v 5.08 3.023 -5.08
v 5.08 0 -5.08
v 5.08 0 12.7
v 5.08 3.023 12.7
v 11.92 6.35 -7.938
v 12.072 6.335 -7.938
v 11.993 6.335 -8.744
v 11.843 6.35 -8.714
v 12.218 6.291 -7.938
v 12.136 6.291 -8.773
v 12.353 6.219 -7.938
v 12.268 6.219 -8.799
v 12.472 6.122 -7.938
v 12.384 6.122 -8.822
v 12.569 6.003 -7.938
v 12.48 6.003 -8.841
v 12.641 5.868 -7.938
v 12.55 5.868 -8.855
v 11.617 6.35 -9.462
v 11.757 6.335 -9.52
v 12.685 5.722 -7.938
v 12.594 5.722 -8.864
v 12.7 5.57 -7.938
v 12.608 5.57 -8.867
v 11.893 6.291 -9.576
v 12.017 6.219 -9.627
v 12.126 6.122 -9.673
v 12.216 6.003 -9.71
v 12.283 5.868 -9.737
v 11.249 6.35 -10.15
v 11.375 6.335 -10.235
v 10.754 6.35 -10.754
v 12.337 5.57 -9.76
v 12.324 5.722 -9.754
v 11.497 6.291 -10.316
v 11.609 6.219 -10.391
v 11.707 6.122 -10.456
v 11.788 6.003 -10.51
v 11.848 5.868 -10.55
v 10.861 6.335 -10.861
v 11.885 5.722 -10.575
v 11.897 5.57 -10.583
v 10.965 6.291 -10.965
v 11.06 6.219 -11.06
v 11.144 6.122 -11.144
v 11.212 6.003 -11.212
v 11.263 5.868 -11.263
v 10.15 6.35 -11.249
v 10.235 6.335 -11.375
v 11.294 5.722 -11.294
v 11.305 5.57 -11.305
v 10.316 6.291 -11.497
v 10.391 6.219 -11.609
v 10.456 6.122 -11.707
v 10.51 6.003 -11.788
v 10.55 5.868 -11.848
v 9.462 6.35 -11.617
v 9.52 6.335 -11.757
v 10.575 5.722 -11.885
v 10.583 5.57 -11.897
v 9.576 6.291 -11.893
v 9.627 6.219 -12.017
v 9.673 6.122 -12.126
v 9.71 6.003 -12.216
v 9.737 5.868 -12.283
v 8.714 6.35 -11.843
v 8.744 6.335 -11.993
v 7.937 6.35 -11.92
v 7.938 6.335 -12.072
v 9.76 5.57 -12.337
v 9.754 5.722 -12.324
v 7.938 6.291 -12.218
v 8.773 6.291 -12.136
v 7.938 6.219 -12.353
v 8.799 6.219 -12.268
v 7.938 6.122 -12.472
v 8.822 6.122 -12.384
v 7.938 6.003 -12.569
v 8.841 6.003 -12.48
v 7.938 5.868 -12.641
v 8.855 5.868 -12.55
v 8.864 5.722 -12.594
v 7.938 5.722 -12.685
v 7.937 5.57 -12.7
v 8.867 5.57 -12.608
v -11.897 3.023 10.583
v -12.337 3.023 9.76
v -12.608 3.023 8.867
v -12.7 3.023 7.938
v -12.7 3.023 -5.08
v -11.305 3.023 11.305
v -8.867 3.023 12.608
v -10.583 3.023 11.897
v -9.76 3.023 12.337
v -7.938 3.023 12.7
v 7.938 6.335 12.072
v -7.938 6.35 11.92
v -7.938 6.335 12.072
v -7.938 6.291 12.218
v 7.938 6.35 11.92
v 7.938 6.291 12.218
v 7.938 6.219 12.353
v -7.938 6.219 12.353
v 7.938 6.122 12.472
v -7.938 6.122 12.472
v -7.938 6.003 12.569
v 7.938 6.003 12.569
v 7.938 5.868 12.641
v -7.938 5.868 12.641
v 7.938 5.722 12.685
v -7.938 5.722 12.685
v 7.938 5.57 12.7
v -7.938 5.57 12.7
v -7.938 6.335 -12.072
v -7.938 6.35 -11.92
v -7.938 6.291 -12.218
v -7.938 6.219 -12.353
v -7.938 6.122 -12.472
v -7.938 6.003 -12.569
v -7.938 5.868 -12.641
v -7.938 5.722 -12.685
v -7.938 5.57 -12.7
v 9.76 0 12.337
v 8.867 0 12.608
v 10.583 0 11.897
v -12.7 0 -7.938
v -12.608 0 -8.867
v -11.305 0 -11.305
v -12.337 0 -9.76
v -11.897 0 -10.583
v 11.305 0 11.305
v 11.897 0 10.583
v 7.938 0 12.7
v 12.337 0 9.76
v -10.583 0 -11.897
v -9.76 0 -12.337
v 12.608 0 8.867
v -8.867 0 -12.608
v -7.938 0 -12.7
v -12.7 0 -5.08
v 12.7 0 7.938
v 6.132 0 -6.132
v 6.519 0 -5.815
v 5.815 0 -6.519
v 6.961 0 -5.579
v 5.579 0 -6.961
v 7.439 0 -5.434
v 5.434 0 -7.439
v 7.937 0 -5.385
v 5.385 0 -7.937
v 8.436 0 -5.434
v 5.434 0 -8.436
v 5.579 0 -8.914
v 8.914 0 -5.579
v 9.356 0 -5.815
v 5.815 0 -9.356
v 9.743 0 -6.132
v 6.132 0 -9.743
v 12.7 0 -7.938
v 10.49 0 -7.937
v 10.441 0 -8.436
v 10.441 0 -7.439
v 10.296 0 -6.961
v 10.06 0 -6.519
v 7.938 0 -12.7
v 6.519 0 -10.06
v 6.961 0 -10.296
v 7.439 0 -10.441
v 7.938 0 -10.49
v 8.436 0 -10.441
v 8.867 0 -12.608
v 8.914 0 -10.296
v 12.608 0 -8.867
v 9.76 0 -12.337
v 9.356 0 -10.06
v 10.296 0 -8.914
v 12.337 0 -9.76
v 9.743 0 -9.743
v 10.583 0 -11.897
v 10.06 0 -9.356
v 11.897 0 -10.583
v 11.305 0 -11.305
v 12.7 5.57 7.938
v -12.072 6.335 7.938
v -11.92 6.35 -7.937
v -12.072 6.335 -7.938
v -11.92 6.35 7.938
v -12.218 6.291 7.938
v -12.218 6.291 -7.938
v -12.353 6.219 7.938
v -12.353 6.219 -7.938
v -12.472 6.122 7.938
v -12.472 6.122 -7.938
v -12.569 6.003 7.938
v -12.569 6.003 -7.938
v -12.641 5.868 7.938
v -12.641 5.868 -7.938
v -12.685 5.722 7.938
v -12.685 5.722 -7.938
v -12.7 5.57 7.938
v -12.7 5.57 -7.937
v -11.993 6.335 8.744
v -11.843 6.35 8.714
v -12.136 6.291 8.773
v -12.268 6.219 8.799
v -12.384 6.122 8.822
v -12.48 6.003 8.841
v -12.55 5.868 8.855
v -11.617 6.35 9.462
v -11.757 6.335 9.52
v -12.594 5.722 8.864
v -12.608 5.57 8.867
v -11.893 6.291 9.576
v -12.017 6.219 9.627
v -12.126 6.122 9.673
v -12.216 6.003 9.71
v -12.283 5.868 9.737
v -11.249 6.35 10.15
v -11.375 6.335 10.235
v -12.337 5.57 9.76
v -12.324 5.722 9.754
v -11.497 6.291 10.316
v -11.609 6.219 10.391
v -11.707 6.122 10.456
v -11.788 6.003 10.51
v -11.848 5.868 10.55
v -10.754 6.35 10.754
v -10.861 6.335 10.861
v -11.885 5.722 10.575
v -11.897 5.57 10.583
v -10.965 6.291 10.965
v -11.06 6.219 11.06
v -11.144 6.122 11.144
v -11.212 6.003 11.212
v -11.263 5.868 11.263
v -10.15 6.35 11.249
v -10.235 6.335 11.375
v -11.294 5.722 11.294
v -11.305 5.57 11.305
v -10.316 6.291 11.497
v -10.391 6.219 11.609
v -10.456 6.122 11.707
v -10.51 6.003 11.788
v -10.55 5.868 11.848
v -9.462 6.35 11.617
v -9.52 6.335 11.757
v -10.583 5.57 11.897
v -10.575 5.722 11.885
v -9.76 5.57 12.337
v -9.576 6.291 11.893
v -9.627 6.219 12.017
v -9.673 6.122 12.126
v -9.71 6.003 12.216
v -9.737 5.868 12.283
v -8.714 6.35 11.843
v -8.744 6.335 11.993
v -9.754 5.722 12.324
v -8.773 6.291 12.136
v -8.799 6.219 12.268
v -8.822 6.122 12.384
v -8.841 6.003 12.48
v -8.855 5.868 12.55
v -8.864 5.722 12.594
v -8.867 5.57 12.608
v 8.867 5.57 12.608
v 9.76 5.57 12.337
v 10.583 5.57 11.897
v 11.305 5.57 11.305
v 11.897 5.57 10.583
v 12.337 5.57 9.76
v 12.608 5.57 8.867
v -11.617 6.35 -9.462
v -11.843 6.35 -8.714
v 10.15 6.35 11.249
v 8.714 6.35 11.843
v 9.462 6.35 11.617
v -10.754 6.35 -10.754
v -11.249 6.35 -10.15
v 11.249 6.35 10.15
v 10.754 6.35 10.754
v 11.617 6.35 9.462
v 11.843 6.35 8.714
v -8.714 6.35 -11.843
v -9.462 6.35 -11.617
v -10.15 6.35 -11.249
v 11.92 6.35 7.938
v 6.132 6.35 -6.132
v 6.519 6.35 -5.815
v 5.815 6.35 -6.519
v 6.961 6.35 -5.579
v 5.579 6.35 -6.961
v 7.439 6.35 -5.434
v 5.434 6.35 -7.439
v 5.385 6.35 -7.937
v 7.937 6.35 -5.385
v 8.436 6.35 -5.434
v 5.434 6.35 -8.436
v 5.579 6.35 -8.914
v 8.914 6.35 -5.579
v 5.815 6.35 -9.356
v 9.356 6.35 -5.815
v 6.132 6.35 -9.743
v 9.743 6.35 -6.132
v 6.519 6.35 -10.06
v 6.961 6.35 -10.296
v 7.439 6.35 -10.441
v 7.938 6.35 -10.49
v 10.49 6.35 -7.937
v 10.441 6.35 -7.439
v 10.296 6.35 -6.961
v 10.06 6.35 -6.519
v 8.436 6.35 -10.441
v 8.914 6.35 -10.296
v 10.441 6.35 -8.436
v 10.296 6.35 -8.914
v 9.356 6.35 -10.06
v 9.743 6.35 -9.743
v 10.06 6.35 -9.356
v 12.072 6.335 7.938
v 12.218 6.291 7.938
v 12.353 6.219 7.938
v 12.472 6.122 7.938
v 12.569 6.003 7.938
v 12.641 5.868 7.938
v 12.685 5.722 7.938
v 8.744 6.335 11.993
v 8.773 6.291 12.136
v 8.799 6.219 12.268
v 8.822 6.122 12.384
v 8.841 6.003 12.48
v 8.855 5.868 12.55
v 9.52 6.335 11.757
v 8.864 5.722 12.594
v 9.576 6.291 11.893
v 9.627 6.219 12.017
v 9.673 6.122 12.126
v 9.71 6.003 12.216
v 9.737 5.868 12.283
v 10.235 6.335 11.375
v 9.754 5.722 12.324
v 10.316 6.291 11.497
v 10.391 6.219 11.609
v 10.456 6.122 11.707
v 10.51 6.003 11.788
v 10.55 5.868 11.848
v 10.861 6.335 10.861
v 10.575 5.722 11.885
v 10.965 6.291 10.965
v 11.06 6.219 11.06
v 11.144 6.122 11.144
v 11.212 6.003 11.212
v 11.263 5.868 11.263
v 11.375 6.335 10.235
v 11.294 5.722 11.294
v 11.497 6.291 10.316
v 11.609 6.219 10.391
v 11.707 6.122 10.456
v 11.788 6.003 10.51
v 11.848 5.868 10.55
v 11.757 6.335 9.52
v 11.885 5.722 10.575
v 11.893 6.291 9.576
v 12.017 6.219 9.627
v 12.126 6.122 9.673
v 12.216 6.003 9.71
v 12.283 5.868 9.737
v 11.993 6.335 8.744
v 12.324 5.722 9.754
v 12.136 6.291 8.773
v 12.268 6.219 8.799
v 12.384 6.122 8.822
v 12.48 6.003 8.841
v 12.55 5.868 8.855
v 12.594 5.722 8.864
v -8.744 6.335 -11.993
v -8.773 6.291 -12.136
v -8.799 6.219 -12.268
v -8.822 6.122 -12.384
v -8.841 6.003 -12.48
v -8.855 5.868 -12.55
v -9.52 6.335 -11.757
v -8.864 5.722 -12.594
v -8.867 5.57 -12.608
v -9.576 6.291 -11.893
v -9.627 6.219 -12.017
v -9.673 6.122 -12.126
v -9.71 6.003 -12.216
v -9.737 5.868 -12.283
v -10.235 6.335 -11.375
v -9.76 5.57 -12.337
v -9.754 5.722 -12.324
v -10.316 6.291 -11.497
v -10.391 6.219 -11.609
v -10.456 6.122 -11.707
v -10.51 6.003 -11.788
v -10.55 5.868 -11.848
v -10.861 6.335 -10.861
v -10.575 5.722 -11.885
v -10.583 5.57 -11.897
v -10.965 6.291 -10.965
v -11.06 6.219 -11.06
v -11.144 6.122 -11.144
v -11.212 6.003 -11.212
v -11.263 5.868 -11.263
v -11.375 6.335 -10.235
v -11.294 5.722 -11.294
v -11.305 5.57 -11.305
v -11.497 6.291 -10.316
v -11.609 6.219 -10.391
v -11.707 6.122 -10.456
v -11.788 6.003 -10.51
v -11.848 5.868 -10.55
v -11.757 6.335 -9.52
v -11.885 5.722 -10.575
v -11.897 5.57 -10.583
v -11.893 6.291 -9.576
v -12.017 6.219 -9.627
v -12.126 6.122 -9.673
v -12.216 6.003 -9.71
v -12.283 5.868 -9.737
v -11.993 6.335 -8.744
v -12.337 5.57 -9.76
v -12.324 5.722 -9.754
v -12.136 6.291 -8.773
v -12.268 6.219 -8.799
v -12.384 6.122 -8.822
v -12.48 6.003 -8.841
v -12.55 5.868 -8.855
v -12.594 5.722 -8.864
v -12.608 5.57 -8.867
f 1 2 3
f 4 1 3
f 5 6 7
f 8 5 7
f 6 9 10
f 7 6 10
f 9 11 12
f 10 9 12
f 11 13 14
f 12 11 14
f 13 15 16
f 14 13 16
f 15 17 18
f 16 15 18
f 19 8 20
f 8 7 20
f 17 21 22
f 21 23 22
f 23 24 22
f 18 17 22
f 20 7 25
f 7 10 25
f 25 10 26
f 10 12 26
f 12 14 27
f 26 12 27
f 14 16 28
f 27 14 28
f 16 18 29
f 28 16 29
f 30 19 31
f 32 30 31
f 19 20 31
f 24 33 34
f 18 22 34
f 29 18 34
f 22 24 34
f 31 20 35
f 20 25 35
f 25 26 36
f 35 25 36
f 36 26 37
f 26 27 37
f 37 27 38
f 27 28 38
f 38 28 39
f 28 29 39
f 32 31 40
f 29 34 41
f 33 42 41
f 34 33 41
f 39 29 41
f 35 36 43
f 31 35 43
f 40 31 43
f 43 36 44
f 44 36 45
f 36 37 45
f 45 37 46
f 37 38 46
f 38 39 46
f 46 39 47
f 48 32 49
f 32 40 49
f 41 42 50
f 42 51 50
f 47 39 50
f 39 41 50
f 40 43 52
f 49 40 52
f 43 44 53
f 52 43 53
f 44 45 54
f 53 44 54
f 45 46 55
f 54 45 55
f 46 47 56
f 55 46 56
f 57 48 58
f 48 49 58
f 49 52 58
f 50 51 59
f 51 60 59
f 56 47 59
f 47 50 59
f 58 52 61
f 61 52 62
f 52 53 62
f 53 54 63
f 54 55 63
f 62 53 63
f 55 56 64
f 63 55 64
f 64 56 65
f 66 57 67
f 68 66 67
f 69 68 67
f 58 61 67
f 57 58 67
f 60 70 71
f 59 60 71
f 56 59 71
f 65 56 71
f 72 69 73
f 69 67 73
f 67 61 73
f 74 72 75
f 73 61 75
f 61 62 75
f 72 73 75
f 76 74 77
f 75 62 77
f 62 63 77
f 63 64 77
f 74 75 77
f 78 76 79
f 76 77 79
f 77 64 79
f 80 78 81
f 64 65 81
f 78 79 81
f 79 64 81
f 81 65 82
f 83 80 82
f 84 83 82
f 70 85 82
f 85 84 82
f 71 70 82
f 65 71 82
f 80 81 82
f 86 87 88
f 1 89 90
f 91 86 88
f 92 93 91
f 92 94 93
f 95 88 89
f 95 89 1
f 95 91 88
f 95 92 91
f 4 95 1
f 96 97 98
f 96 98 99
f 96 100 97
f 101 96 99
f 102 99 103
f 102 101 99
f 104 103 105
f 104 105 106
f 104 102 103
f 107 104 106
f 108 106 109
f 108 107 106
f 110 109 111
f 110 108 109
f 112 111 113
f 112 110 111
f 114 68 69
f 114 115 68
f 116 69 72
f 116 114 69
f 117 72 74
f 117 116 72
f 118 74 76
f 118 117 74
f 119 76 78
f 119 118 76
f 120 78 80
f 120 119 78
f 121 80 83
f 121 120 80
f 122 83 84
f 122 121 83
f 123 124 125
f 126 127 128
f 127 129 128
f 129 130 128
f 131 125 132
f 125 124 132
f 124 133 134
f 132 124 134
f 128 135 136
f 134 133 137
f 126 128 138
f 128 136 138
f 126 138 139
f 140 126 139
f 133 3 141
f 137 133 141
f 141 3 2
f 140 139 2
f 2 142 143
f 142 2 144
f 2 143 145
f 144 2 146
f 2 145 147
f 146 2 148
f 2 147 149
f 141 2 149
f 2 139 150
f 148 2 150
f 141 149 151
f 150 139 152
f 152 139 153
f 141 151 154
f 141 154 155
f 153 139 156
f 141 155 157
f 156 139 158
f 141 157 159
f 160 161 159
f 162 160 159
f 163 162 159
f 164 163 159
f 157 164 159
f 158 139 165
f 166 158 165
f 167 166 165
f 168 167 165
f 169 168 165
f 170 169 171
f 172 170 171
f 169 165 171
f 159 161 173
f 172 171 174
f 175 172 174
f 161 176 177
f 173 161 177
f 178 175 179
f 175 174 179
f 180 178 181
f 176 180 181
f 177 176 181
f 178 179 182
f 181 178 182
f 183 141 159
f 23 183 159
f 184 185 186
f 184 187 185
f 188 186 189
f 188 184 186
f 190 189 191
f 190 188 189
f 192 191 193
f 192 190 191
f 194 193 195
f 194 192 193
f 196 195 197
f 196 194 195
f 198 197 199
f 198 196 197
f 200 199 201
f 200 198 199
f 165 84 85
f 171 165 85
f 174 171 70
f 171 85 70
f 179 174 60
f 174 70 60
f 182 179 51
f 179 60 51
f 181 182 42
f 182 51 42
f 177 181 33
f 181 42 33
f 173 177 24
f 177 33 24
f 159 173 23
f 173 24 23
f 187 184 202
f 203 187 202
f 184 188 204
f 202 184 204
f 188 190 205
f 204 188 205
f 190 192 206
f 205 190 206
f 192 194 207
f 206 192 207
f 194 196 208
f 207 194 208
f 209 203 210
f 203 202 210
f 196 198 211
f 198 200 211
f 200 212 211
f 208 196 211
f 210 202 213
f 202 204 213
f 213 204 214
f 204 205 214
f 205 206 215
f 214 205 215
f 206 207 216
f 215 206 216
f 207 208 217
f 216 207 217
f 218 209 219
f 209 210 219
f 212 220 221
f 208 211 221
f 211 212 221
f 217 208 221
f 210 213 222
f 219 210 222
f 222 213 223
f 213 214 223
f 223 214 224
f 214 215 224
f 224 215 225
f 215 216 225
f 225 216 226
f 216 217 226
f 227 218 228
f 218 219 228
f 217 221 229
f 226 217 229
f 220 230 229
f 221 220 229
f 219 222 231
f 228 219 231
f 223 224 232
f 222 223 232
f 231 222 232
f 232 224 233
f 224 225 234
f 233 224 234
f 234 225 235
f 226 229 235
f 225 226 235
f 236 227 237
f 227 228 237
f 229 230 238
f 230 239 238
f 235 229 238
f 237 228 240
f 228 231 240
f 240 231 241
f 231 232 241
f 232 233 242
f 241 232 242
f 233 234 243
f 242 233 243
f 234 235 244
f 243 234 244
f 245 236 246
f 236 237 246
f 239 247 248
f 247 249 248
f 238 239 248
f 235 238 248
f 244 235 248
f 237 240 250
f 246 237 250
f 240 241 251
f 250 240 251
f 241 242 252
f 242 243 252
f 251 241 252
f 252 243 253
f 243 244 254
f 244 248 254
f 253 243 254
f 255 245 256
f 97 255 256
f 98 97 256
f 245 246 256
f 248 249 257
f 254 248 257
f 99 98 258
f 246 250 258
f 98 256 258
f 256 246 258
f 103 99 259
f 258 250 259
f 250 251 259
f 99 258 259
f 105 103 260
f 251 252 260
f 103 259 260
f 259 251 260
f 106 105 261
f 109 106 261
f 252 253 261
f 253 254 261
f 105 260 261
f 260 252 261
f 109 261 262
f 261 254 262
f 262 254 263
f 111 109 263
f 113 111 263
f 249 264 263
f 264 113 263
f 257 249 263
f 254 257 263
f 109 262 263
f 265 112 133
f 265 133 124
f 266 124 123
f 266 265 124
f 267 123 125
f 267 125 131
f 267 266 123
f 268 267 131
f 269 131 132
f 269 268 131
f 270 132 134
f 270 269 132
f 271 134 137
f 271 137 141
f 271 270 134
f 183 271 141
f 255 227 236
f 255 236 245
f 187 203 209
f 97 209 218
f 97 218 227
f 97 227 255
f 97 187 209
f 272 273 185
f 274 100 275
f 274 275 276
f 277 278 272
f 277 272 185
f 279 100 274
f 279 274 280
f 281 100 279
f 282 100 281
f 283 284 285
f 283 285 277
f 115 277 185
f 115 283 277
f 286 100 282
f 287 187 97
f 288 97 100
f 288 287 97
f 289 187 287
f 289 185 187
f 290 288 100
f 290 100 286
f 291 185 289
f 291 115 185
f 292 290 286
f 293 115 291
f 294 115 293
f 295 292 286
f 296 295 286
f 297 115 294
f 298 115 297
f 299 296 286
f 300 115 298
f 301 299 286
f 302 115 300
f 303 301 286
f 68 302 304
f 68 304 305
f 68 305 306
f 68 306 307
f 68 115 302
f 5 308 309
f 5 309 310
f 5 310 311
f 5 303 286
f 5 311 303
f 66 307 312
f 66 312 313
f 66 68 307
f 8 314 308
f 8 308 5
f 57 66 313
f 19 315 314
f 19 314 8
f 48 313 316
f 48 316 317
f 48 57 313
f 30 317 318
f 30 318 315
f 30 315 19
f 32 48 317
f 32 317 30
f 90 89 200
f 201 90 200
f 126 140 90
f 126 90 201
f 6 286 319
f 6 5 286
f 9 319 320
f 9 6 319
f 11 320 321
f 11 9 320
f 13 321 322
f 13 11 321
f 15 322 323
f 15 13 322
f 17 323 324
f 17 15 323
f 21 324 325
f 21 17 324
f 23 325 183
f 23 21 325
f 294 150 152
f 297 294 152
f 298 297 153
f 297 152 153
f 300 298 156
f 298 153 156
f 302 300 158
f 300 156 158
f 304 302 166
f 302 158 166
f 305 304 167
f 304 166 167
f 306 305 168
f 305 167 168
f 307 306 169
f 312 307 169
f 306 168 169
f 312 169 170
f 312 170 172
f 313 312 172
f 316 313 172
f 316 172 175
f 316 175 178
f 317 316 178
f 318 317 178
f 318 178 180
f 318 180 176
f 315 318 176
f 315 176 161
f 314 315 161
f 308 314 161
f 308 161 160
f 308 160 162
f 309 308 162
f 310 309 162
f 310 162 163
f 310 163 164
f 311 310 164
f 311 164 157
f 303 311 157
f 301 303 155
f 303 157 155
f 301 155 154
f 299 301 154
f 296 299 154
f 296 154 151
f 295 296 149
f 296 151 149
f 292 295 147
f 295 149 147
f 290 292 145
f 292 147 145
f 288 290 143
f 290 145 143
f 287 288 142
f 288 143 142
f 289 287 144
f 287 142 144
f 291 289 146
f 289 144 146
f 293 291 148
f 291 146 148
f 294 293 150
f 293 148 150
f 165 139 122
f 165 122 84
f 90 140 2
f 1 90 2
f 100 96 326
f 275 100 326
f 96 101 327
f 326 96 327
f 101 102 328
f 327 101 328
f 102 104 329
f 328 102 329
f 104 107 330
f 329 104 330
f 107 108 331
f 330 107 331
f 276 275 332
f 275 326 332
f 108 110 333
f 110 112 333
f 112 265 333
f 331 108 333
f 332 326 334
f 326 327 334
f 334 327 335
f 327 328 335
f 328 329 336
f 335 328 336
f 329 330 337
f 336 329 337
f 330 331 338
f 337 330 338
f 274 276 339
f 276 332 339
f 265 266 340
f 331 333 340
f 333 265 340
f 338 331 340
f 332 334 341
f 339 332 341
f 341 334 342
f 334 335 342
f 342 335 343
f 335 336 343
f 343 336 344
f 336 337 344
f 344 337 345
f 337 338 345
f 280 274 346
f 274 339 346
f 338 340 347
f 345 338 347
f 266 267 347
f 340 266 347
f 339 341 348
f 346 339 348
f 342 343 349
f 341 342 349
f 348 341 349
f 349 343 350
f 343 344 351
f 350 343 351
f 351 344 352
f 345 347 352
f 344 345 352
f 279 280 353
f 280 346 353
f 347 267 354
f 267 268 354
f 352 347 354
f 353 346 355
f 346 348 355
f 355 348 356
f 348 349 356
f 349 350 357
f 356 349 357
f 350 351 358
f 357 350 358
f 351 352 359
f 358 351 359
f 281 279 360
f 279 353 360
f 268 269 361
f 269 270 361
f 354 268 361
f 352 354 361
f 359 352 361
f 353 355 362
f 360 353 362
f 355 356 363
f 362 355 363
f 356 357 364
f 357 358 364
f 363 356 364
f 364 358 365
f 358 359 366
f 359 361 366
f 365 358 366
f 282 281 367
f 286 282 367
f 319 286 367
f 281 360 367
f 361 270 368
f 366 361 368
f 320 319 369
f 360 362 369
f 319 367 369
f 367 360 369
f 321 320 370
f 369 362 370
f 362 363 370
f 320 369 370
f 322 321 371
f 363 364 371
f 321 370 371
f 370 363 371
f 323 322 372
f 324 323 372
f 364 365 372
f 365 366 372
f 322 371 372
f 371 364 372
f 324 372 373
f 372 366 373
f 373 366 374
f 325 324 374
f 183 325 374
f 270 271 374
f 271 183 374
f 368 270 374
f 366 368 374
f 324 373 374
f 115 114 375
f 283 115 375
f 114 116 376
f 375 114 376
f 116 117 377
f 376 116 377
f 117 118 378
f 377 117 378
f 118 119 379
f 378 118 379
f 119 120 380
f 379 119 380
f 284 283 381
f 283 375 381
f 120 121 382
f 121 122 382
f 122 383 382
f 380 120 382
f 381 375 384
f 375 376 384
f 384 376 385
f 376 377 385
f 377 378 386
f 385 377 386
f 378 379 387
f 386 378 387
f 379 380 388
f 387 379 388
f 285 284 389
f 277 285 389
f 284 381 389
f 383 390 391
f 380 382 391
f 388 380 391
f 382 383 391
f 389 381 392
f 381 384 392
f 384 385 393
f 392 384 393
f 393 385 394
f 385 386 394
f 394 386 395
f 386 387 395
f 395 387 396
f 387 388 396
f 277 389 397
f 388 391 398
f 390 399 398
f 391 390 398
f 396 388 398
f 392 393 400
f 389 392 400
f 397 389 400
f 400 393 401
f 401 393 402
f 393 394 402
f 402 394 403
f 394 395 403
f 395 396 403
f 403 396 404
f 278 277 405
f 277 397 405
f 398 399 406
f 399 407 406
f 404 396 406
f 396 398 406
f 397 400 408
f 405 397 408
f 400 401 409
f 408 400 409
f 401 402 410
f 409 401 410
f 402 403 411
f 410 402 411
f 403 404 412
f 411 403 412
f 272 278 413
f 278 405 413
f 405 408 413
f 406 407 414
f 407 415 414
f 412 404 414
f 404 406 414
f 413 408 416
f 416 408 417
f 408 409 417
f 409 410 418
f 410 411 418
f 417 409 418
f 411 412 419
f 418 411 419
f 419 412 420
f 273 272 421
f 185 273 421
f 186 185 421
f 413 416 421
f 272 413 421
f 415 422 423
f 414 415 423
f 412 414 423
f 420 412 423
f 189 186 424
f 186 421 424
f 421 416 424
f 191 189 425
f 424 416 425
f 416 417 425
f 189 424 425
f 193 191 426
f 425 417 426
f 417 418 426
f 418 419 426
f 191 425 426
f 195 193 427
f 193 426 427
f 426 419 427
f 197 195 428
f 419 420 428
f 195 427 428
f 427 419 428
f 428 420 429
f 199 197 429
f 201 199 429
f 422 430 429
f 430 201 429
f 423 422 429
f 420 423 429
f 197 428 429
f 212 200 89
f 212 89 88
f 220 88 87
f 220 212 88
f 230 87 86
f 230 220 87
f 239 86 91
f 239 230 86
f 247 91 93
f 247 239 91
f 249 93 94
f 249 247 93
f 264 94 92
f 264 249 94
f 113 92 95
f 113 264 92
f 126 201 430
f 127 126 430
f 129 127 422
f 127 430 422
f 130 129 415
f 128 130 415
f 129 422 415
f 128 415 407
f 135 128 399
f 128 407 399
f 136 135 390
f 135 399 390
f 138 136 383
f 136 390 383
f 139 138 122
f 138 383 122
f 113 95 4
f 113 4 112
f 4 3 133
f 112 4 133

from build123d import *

# Parameters (mm, degrees)
SKETCH1_W                  = 25.4
SKETCH1_H                  = 25.4
BOSS_EXTRUDE1_DEPTH        = 6.35
SKETCH2_W                  = 17.78
SKETCH2_H                  = 17.78
CUT_EXTRUDE1_DEPTH         = 3.0226
FILLET1_R                  = 4.7625
F_10_CLEARANCE_HOLE1_D     = 5.1054
F_10_CLEARANCE_HOLE1_DEPTH = 10.668
F_10_CLEARANCE_HOLE1_TIP   = 1.533816902
FILLET2_R                  = 0.78


with BuildPart() as part:
    # Sketch1 → Boss-Extrude1 (new body)
    with BuildSketch(Plane(origin=(0, 0, 0), x_dir=(1, 0, 0), z_dir=(0, 1, 0))):
        Rectangle(SKETCH1_W, SKETCH1_H)
    extrude(amount=BOSS_EXTRUDE1_DEPTH)

    # Sketch2 → Cut-Extrude1 (cut)
    with BuildSketch(Plane.XZ):
        with Locations((-3.81, 3.81)):
            Rectangle(SKETCH2_W, SKETCH2_H)
    extrude(amount=-CUT_EXTRUDE1_DEPTH, mode=Mode.SUBTRACT)

    # Fillet1
    fillet1_edges = [part.edges().sort_by_distance(p)[0] for p in [
        (12.7, 3.175, 12.7),
        (-12.7, 4.6863, 12.7),
        (-12.7, 3.175, -12.7),
        (12.7, 3.175, -12.7),
    ]]
    fillet(fillet1_edges, radius=FILLET1_R)

    # #10 Clearance Hole1
    with Locations(Plane(origin=(0, 6.35, 0), x_dir=(1, 0, 0), z_dir=(0, 1, 0))):
        with Locations((7.9375, 7.9375)):
            Hole(F_10_CLEARANCE_HOLE1_D / 2, depth=F_10_CLEARANCE_HOLE1_DEPTH)
            with Locations((0, 0, -(F_10_CLEARANCE_HOLE1_DEPTH + F_10_CLEARANCE_HOLE1_TIP / 2))):  # 118° drill point
                Cone(0, F_10_CLEARANCE_HOLE1_D / 2, F_10_CLEARANCE_HOLE1_TIP, mode=Mode.SUBTRACT)

    # Fillet2
    fillet2_edges = [part.edges().sort_by_distance(p)[0] for p in [
        (0, 6.35, 12.7),
        (-12.7, 6.35, 0),
        (12.7, 6.35, 0),
        (0, 6.35, -12.7),
        (11.305096045, 6.35, 11.305096045),
        (11.305096045, 6.35, -11.305096045),
        (-11.305096045, 6.35, -11.305096045),
        (-11.305096045, 6.35, 11.305096045),
    ]]
    fillet(fillet2_edges, radius=FILLET2_R)


solid = part.part
